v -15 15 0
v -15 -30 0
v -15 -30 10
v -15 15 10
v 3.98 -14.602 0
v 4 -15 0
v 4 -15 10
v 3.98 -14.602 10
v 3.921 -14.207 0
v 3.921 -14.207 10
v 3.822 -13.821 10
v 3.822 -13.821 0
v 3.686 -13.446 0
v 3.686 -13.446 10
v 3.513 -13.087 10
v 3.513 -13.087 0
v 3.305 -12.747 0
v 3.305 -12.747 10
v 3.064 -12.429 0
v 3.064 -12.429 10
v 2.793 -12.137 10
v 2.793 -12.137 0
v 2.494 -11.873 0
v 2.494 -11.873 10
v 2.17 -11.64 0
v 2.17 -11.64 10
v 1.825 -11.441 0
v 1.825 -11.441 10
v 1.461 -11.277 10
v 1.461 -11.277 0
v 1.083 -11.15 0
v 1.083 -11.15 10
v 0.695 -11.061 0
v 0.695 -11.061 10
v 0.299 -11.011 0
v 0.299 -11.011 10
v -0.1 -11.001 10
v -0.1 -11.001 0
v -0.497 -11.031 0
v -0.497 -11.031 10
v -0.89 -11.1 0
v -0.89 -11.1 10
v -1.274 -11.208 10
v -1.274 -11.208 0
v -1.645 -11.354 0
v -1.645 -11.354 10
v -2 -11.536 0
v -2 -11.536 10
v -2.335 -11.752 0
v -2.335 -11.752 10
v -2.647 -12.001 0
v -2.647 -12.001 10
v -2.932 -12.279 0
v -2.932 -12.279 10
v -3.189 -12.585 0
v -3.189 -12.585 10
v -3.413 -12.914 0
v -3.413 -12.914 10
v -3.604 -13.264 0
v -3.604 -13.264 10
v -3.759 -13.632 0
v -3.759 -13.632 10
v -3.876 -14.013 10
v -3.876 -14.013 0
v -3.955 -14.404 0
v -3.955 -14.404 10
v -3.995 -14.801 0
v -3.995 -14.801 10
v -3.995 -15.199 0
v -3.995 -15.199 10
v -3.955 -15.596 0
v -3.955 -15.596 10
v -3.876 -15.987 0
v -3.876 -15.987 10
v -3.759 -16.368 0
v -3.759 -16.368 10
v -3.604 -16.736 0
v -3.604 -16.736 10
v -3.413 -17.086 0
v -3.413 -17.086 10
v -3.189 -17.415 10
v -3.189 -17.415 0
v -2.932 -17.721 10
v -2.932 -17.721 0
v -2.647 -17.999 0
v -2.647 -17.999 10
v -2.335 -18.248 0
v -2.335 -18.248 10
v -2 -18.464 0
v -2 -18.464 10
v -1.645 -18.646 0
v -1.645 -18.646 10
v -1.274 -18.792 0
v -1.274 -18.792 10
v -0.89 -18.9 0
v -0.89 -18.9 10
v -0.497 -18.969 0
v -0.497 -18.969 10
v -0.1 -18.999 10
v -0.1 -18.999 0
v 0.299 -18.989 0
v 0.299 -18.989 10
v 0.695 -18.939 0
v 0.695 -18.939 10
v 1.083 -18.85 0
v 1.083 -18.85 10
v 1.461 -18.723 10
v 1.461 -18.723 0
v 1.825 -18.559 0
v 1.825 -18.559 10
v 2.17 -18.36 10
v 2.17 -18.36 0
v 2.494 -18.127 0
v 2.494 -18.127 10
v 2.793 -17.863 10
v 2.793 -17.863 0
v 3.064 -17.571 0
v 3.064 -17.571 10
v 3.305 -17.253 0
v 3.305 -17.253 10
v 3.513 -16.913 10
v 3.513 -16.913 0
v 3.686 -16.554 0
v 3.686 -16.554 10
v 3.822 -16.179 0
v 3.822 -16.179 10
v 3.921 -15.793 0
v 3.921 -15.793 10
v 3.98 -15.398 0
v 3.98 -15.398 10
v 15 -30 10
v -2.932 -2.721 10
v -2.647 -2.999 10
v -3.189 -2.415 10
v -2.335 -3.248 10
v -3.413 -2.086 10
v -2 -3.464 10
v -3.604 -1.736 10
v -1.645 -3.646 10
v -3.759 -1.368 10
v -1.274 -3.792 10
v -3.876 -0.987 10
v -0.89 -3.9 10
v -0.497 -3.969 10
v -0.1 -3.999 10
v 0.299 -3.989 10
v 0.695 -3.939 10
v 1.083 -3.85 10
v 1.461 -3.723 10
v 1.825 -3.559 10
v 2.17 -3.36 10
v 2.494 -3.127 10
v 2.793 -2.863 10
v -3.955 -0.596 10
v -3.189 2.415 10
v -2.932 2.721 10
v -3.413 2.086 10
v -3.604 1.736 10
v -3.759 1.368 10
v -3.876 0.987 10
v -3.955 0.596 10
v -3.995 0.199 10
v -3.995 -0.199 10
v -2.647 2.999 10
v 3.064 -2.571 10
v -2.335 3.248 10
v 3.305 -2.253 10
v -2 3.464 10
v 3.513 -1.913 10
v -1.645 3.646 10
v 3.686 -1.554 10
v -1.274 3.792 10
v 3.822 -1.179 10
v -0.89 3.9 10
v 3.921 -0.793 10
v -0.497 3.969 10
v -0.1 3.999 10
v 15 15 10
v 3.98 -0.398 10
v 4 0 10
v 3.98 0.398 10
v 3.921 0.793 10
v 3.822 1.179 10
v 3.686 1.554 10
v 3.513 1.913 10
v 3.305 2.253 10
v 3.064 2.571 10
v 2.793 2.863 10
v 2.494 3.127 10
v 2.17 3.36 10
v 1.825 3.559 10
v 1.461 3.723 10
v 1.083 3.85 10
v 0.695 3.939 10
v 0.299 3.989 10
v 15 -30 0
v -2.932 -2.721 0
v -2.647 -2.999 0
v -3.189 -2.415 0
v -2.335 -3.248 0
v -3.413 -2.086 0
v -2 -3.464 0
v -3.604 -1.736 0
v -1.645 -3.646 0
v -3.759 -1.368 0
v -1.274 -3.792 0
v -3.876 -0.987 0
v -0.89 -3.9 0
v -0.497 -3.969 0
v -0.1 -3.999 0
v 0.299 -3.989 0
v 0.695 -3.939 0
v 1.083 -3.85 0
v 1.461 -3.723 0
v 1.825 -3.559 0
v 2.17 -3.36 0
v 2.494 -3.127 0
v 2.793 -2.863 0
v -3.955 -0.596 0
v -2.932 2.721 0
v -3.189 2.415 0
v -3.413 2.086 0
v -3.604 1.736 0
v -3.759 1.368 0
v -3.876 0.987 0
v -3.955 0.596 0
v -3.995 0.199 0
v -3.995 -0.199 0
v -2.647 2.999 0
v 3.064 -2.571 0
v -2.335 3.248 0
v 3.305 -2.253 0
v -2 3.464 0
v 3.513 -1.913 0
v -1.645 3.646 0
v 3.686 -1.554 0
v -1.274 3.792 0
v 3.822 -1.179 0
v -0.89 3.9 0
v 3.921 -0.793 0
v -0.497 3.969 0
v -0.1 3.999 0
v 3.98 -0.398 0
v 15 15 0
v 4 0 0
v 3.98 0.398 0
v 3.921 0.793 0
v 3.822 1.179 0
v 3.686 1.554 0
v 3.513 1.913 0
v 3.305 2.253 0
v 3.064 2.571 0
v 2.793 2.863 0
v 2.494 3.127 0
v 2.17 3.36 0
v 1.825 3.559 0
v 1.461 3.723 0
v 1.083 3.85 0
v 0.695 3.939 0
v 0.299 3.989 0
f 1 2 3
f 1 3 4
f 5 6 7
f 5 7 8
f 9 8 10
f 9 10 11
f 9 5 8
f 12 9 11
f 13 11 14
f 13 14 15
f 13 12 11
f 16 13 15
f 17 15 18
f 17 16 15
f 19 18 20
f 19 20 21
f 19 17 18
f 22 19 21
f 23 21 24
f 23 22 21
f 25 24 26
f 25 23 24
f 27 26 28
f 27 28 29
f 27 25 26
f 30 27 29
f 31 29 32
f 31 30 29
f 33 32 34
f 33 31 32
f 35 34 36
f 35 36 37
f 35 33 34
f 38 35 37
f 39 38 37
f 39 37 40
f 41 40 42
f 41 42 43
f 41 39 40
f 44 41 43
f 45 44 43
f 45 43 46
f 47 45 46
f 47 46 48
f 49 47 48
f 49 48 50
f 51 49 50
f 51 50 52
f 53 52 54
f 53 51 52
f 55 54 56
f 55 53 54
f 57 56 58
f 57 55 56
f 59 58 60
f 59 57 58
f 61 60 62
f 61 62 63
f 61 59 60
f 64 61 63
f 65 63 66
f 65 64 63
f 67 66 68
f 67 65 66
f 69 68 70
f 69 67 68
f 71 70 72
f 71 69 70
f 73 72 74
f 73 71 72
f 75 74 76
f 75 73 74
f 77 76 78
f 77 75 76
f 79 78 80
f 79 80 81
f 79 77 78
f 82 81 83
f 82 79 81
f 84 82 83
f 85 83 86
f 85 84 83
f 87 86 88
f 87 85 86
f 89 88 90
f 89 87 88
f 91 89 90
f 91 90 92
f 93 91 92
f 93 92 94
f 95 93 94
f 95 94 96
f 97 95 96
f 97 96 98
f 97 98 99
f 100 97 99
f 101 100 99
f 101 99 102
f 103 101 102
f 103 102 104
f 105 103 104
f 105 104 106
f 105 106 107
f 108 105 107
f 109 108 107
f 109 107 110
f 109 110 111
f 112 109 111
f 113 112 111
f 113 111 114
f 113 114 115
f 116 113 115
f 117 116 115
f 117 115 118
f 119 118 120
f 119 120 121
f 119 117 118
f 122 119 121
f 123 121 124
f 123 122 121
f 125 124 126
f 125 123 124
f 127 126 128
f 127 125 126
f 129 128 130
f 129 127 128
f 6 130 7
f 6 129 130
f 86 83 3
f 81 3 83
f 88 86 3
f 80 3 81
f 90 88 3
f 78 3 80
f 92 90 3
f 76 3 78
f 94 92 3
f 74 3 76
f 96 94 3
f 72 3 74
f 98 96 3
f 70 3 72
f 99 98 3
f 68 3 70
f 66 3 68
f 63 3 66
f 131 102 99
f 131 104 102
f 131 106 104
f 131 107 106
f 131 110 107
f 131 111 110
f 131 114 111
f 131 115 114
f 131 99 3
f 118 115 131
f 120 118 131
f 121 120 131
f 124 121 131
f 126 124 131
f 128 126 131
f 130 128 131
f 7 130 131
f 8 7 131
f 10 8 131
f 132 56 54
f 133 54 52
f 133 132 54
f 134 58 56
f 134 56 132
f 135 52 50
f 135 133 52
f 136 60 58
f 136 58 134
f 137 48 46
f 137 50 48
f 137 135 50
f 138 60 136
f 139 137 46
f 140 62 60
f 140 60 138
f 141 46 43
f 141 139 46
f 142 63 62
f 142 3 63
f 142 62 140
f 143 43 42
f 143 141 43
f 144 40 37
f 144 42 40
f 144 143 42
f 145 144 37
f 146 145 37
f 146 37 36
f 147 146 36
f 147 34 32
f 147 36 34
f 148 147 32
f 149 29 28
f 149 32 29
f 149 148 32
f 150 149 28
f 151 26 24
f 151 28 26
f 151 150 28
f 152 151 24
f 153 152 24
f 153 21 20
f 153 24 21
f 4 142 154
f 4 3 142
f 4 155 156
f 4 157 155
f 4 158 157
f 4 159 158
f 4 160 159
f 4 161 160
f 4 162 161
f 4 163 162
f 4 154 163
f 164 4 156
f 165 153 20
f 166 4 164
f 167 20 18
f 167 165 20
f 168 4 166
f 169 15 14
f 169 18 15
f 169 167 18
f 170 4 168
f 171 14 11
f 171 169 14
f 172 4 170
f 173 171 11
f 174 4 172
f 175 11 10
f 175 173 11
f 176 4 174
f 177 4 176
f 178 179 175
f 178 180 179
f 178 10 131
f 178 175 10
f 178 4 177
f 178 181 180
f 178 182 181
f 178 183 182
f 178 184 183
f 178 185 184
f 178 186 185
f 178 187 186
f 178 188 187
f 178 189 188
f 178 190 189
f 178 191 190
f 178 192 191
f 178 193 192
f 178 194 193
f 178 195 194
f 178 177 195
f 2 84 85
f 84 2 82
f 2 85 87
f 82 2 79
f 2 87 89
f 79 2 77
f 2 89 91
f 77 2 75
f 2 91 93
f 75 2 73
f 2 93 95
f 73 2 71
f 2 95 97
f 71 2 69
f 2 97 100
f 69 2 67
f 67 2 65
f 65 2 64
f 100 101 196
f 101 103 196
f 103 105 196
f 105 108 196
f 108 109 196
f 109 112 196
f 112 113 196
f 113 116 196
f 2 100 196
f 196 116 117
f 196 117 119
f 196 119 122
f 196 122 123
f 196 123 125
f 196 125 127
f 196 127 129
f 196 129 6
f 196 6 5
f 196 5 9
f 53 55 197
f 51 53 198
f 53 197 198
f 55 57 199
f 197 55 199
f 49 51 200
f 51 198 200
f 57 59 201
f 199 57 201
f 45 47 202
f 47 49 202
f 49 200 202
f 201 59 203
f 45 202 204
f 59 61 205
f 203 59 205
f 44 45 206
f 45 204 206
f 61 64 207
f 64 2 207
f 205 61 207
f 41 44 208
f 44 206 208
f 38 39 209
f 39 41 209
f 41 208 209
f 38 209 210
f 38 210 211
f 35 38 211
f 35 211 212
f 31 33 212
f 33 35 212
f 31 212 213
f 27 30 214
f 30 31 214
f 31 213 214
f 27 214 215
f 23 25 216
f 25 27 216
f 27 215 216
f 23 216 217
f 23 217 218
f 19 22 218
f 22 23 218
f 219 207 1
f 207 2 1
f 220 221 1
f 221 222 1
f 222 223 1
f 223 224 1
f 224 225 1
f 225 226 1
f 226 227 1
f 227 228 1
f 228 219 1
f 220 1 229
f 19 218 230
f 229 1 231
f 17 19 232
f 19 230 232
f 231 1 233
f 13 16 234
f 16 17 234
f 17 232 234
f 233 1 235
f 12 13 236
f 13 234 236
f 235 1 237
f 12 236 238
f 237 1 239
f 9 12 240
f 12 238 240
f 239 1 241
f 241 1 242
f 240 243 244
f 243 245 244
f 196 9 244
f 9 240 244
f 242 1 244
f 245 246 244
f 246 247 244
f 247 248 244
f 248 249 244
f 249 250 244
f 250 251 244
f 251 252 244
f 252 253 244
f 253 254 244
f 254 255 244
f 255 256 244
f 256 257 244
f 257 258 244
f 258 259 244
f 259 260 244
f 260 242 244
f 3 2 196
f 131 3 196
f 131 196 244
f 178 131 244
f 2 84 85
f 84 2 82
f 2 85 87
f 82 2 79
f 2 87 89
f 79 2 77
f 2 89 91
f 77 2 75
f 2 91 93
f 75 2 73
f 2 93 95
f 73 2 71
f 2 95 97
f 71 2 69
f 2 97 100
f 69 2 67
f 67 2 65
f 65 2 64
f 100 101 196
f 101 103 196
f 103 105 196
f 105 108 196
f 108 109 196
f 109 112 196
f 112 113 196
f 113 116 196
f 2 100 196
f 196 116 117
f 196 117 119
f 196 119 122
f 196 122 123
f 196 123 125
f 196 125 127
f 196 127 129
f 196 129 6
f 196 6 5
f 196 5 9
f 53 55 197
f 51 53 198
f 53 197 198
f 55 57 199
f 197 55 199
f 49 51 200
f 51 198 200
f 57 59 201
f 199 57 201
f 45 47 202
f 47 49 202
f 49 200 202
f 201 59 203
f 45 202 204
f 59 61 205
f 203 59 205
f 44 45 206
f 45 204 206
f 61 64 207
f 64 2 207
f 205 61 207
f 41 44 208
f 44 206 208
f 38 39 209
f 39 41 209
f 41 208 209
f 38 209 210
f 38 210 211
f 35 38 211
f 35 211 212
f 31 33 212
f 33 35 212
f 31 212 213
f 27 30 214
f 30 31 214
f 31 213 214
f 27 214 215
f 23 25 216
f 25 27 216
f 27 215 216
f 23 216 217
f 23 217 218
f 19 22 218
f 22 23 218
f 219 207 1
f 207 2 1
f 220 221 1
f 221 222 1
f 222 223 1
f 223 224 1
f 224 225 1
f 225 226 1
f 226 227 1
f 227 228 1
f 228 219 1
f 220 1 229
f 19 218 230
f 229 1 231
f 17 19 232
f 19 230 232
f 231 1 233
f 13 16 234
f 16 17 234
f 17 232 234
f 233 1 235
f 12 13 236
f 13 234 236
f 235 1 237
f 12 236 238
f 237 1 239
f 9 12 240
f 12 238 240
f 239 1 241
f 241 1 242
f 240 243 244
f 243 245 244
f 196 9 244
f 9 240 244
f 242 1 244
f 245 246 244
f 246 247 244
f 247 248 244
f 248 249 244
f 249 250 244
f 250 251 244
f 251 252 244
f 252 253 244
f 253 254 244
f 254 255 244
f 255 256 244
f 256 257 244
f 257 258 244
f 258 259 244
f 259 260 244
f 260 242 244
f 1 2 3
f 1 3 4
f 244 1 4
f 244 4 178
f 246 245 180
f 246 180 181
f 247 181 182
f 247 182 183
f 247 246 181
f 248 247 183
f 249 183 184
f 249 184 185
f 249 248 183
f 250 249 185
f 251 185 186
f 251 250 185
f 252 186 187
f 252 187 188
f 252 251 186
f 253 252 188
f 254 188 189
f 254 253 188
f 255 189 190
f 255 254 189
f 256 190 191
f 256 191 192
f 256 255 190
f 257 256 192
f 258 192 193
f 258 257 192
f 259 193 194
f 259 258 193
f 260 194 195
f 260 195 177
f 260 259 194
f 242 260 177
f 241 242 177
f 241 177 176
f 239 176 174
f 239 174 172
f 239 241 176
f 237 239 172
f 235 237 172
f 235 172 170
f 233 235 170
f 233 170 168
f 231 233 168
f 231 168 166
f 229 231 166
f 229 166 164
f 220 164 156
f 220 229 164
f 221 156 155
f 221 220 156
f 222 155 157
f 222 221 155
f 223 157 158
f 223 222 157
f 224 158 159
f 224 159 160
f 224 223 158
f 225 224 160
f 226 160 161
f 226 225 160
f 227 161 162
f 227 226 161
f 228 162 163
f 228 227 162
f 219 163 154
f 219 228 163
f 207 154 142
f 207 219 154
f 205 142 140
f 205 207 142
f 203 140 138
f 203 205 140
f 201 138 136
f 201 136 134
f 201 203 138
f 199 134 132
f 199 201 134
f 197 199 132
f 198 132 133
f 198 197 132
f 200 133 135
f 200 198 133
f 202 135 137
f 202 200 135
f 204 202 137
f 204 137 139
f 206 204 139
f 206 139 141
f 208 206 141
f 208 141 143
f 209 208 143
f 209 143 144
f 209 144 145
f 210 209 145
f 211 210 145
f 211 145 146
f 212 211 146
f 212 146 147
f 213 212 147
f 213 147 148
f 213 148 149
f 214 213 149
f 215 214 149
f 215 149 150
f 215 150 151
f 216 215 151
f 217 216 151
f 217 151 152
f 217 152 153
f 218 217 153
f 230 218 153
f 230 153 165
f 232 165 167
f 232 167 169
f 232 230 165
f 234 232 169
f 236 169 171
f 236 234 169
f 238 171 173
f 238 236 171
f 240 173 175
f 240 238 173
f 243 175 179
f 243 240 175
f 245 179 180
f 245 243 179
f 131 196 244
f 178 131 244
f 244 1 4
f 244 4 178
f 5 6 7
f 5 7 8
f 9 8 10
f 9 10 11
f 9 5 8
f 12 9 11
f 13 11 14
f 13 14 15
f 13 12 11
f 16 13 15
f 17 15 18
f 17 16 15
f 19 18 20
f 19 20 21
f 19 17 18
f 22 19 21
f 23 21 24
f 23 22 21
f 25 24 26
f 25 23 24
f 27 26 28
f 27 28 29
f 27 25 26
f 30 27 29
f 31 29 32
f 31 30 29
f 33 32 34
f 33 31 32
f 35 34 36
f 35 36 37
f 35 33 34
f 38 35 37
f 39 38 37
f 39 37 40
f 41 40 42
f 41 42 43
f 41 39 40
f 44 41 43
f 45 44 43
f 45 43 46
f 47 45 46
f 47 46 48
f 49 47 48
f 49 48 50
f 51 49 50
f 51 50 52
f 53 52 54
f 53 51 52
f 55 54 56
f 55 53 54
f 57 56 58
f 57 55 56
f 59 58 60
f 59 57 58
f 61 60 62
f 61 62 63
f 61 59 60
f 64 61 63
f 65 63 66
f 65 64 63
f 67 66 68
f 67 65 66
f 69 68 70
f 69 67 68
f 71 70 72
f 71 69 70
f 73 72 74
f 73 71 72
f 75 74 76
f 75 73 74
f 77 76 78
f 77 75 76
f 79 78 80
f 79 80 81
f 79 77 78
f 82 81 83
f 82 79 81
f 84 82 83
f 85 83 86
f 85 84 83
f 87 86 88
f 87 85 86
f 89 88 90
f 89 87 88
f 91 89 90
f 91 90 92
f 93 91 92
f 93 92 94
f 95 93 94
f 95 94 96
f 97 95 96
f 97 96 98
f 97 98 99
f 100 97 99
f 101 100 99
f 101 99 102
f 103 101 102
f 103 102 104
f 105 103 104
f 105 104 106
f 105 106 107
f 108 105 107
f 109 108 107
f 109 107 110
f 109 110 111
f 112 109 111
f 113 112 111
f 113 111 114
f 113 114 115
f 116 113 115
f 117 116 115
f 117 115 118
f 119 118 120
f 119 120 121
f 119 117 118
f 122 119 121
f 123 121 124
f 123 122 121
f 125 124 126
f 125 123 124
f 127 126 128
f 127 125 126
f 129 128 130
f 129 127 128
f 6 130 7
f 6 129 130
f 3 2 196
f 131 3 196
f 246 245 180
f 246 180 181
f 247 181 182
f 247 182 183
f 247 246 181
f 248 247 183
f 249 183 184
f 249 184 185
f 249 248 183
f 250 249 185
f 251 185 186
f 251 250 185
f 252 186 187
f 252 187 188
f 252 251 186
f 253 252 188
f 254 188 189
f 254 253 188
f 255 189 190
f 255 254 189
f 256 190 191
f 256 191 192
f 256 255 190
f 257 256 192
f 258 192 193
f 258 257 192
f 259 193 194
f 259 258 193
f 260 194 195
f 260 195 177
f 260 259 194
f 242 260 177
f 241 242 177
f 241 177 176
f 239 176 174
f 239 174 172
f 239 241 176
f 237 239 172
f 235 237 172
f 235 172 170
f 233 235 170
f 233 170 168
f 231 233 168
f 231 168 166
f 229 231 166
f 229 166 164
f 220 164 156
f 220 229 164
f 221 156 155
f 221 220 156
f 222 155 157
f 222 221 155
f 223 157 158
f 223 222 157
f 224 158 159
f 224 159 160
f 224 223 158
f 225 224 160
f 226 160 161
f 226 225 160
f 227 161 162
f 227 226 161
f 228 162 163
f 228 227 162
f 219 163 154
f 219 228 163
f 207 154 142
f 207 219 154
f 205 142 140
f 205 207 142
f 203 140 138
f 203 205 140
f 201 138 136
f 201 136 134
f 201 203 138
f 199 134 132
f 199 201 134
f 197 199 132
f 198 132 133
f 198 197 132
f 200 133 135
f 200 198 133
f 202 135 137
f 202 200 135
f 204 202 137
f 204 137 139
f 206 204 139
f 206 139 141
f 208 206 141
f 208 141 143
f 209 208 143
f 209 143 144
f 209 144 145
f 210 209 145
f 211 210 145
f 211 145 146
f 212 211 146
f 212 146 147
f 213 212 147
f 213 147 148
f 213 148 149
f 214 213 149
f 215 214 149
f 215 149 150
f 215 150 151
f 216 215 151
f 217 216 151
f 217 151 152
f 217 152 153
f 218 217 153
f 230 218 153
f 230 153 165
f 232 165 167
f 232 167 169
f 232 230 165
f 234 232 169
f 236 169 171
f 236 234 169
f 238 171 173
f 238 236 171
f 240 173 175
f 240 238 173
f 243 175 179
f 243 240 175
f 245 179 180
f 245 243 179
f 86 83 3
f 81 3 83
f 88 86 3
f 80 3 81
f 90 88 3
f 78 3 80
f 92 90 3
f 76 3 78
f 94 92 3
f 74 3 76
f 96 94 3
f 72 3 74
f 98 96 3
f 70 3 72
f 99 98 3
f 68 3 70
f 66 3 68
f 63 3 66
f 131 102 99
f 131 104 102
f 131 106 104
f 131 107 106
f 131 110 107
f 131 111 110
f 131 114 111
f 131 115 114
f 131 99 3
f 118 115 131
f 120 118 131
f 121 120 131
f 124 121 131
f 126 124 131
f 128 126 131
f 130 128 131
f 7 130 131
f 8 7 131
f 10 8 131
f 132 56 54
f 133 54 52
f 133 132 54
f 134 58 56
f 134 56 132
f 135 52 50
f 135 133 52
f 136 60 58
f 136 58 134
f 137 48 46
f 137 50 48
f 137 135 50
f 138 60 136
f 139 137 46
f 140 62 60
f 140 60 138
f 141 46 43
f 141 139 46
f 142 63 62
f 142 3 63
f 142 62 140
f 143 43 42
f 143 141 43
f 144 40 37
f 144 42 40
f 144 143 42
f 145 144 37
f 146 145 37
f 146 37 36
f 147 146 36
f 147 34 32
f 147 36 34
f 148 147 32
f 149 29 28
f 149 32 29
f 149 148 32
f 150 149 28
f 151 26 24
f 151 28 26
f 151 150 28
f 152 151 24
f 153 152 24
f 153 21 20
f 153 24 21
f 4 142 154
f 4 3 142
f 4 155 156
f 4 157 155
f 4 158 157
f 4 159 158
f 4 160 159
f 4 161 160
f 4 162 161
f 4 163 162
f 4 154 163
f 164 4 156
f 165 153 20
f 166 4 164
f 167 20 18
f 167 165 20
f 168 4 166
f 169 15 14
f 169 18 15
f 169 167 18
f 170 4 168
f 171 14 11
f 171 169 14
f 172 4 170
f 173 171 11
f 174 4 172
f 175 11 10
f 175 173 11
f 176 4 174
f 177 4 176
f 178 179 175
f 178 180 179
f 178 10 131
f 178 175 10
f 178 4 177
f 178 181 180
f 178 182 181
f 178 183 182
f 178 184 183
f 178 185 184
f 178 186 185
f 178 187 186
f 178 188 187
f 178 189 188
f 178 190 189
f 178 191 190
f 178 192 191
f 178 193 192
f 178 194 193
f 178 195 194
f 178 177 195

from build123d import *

# Parameters (mm, degrees)
SKETCH_W         = 30
SKETCH_H         = 45
SKETCH_R         = 4
EXTRUDE_DEPTH    = 10
EXTRUDE001_DEPTH = 10


with BuildPart() as extrude_body:
    # Sketch → Extrude (new body)
    with BuildSketch(Plane.XY):
        with Locations((0, -7.5)):
            Rectangle(SKETCH_W, SKETCH_H)
        Circle(SKETCH_R, mode=Mode.SUBTRACT)
        with Locations((0, -15)):
            Circle(SKETCH_R, mode=Mode.SUBTRACT)
    extrude(amount=EXTRUDE_DEPTH)


with BuildPart() as extrude001:
    # Sketch → Extrude001 (new body)
    with BuildSketch(Plane.XY):
        with Locations((0, -7.5)):
            Rectangle(SKETCH_W, SKETCH_H)
        Circle(SKETCH_R, mode=Mode.SUBTRACT)
        with Locations((0, -15)):
            Circle(SKETCH_R, mode=Mode.SUBTRACT)
    extrude(amount=EXTRUDE001_DEPTH)


solid = Compound([extrude_body.part, extrude001.part])
